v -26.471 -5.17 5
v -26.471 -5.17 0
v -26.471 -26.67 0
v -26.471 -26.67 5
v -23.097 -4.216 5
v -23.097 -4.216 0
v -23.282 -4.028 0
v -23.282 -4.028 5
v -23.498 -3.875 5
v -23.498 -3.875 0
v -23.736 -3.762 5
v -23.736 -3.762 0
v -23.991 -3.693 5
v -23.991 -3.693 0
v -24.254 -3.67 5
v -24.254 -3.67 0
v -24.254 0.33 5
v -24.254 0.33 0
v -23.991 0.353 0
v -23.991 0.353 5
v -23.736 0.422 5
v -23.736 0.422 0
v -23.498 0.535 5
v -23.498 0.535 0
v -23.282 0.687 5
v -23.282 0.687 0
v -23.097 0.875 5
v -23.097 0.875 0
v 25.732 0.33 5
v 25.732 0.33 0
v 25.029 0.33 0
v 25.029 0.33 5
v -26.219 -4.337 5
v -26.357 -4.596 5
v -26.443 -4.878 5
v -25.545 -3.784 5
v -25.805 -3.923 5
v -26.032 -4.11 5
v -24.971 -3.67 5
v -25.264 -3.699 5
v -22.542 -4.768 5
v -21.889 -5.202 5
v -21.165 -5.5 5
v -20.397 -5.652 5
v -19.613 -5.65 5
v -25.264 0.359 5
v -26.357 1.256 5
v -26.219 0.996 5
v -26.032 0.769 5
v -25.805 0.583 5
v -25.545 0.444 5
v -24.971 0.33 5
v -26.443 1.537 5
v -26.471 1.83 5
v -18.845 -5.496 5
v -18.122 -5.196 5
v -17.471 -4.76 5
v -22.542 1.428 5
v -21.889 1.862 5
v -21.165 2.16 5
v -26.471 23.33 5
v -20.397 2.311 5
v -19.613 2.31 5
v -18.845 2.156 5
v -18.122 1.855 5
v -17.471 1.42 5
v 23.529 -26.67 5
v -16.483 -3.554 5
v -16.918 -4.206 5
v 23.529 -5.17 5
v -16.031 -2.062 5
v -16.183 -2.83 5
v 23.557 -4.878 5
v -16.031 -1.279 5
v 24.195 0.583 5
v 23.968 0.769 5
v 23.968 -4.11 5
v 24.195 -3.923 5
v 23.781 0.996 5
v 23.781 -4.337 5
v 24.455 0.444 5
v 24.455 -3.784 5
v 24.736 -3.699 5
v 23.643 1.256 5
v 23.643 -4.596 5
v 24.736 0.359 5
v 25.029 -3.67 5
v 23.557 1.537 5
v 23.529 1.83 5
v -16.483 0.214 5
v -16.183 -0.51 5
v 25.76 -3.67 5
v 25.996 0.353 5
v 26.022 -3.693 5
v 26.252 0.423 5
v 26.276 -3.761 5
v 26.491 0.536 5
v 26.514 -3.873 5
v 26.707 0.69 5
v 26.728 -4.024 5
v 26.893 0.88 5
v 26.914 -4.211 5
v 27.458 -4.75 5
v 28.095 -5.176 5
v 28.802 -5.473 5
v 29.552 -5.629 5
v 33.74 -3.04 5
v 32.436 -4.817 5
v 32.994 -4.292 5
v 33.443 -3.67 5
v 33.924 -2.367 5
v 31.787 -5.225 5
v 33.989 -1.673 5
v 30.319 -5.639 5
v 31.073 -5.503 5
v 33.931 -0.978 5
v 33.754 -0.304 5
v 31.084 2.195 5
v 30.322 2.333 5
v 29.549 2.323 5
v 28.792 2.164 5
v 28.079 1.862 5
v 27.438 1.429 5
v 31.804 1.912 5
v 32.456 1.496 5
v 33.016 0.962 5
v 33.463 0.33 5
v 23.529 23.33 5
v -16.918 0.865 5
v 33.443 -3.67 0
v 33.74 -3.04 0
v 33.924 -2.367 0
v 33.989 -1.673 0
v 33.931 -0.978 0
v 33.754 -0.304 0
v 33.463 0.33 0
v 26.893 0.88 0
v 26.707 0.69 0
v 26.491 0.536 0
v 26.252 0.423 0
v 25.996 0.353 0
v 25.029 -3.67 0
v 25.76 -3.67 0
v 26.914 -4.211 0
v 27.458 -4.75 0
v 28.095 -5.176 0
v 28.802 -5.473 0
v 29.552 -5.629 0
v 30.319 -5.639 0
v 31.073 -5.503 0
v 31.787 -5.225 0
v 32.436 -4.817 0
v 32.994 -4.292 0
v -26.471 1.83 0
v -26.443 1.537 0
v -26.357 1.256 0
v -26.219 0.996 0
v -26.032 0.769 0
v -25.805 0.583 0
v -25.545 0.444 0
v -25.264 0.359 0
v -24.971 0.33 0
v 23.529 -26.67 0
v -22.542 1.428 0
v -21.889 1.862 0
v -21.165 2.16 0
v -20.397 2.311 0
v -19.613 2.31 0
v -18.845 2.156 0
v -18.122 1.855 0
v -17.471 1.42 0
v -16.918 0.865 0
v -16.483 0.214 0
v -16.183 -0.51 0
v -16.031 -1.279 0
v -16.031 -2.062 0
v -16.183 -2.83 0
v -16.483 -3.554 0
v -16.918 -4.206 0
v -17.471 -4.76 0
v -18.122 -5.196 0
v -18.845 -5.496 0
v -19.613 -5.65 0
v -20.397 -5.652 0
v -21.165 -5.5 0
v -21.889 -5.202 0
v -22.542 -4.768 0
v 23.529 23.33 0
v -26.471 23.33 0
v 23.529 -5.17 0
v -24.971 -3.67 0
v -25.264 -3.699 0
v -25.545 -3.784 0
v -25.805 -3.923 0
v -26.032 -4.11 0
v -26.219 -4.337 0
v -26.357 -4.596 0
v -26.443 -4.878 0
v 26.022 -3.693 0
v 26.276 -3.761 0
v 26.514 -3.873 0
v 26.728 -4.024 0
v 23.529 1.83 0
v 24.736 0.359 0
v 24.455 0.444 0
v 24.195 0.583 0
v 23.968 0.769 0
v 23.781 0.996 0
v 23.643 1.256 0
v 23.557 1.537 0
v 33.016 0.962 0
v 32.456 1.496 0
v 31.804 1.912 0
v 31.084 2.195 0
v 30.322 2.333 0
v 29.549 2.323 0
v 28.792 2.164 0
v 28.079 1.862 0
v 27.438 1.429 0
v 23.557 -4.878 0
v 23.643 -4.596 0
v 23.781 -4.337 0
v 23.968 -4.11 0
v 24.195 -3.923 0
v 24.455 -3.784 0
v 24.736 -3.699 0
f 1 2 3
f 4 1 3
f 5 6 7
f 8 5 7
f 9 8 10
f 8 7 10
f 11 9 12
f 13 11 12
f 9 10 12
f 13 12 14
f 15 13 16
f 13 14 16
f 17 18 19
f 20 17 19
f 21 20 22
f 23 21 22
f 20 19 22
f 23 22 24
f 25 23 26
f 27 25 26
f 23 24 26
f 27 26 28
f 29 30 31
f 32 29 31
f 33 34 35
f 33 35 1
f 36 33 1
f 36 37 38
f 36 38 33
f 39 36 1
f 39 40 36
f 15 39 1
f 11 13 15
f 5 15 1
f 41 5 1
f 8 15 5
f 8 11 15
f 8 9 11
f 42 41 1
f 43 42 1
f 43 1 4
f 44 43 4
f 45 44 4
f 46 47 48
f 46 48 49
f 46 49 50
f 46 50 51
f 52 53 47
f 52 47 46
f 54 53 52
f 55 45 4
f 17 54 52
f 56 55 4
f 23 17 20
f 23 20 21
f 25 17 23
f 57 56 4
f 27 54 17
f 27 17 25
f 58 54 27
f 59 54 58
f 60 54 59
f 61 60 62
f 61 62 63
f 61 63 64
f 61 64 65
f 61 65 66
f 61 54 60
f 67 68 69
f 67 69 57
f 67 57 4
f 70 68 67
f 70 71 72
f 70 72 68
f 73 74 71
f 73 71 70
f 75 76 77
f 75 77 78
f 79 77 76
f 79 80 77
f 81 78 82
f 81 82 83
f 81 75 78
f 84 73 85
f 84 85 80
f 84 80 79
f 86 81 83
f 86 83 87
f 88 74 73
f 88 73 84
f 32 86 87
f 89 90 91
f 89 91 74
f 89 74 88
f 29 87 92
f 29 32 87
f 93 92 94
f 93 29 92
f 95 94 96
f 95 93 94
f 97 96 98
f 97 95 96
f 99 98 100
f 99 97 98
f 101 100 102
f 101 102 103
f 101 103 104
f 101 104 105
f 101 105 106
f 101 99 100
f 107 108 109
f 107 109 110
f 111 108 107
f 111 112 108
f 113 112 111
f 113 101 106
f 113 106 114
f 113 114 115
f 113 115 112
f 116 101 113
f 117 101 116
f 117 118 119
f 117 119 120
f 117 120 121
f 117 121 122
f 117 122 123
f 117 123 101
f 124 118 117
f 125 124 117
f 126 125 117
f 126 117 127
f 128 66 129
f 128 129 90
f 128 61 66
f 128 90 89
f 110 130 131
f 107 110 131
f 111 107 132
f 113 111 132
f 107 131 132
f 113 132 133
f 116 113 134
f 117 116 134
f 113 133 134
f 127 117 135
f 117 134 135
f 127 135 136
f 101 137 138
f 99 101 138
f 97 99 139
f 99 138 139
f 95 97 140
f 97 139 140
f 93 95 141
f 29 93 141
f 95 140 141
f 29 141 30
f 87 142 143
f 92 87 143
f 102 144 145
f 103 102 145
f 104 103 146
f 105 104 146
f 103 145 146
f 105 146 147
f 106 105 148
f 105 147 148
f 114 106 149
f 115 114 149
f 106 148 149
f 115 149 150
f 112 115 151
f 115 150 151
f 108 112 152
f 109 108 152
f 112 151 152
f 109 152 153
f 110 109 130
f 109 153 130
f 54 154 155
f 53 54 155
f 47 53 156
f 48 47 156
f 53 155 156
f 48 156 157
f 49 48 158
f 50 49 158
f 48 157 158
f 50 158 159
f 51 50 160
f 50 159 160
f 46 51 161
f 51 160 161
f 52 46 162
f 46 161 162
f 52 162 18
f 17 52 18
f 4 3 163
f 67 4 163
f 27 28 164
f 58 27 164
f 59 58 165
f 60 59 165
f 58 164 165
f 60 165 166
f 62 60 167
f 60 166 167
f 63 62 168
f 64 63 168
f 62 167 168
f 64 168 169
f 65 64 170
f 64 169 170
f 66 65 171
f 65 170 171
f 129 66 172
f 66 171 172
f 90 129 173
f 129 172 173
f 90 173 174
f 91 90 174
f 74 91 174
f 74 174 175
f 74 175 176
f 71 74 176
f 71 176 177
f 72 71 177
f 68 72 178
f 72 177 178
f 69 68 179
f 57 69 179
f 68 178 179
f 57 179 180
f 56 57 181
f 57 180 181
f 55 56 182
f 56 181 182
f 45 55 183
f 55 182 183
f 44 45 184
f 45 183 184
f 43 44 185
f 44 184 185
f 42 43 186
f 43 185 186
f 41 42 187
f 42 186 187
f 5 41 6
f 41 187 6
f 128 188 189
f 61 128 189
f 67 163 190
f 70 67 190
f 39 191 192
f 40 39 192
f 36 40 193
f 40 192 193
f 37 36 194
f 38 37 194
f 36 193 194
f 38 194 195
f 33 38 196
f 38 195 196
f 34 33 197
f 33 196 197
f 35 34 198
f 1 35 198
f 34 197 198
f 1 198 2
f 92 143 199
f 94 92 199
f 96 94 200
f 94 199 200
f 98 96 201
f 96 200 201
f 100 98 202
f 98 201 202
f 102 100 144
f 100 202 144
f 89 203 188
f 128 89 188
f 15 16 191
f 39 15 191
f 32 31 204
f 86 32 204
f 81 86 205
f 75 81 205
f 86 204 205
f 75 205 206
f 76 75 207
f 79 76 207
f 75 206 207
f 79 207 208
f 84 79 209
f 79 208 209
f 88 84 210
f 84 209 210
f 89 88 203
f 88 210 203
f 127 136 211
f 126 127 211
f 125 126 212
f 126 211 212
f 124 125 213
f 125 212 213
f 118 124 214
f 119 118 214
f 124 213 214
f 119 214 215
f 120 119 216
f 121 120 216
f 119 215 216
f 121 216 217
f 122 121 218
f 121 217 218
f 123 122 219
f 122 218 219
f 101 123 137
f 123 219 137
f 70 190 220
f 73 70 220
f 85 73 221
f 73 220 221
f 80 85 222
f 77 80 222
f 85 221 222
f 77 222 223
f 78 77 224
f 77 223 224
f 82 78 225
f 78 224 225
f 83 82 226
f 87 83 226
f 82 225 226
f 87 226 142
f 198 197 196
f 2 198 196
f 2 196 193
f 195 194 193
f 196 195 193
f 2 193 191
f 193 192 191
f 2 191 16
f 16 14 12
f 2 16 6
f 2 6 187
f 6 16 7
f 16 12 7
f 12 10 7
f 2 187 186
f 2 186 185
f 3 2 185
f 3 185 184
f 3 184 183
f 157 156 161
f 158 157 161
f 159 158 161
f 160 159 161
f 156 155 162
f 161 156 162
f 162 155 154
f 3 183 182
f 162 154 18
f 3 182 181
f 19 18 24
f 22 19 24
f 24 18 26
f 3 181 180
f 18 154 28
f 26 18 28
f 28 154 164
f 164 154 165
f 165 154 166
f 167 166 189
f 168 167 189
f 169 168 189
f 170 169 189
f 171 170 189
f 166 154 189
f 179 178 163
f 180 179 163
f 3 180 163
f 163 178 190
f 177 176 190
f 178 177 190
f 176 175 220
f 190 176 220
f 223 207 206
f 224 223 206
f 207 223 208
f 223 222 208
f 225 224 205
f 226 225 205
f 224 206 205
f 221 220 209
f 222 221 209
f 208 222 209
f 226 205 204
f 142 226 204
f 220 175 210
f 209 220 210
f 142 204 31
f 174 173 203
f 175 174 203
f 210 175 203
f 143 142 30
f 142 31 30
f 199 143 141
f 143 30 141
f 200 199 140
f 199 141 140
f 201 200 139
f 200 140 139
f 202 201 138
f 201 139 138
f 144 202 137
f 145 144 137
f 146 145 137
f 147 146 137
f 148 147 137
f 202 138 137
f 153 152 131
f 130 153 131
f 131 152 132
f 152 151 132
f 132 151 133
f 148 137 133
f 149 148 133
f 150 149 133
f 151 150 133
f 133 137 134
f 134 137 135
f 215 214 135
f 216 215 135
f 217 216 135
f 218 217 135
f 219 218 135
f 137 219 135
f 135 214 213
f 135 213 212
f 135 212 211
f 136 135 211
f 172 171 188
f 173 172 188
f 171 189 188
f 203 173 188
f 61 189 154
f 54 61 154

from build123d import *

# Parameters (mm, degrees)
F1_DEPTH = 5


with BuildPart() as f1:
    # F0 (on Top) → F1 (new body)
    with BuildSketch(Plane.XY):
        with BuildLine():
            Line((23.528581, 23.329832), (-26.471419, 23.329832))
            Line((-26.471419, 23.329832), (-26.471419, 1.829832))
            ThreePointArc((-26.471419, 1.829832), (-26.032079, 0.769172), (-24.971419, 0.329832))
            Line((-24.971419, 0.329832), (-24.25406, 0.329832))
            ThreePointArc((-24.25406, 0.329832), (-23.614457, 0.473031), (-23.096976, 0.875286))
            ThreePointArc((-23.096976, 0.875286), (-16.011419, -1.670168), (-23.096976, -4.215623))
            ThreePointArc((-23.096976, -4.215623), (-23.614457, -3.813367), (-24.25406, -3.670168))
            Line((-24.25406, -3.670168), (-24.971419, -3.670168))
            ThreePointArc((-24.971419, -3.670168), (-26.032079, -4.109508), (-26.471419, -5.170168))
            Line((-26.471419, -5.170168), (-26.471419, -26.670168))
            Line((-26.471419, -26.670168), (23.528581, -26.670168))
            Line((23.528581, -26.670168), (23.528581, -5.170168))
            ThreePointArc((23.528581, -5.170168), (23.967921, -4.109508), (25.028581, -3.670168))
            Line((25.028581, -3.670168), (25.76043, -3.670168))
            ThreePointArc((25.76043, -3.670168), (26.39723, -3.812049), (26.913562, -4.210853))
            ThreePointArc((26.913562, -4.210853), (30.318704, -5.639032), (33.442526, -3.670168))
            ThreePointArc((33.442526, -3.670168), (33.98853, -1.672874), (33.462722, 0.329832))
            ThreePointArc((33.462722, 0.329832), (30.322397, 2.333369), (26.892574, 0.880056))
            ThreePointArc((26.892574, 0.880056), (26.373965, 0.47435), (25.731572, 0.329832))
            Line((25.731572, 0.329832), (25.028581, 0.329832))
            ThreePointArc((25.028581, 0.329832), (23.967921, 0.769172), (23.528581, 1.829832))
            Line((23.528581, 1.829832), (23.528581, 23.329832))
        make_face()
    extrude(amount=F1_DEPTH)


solid = f1.part
